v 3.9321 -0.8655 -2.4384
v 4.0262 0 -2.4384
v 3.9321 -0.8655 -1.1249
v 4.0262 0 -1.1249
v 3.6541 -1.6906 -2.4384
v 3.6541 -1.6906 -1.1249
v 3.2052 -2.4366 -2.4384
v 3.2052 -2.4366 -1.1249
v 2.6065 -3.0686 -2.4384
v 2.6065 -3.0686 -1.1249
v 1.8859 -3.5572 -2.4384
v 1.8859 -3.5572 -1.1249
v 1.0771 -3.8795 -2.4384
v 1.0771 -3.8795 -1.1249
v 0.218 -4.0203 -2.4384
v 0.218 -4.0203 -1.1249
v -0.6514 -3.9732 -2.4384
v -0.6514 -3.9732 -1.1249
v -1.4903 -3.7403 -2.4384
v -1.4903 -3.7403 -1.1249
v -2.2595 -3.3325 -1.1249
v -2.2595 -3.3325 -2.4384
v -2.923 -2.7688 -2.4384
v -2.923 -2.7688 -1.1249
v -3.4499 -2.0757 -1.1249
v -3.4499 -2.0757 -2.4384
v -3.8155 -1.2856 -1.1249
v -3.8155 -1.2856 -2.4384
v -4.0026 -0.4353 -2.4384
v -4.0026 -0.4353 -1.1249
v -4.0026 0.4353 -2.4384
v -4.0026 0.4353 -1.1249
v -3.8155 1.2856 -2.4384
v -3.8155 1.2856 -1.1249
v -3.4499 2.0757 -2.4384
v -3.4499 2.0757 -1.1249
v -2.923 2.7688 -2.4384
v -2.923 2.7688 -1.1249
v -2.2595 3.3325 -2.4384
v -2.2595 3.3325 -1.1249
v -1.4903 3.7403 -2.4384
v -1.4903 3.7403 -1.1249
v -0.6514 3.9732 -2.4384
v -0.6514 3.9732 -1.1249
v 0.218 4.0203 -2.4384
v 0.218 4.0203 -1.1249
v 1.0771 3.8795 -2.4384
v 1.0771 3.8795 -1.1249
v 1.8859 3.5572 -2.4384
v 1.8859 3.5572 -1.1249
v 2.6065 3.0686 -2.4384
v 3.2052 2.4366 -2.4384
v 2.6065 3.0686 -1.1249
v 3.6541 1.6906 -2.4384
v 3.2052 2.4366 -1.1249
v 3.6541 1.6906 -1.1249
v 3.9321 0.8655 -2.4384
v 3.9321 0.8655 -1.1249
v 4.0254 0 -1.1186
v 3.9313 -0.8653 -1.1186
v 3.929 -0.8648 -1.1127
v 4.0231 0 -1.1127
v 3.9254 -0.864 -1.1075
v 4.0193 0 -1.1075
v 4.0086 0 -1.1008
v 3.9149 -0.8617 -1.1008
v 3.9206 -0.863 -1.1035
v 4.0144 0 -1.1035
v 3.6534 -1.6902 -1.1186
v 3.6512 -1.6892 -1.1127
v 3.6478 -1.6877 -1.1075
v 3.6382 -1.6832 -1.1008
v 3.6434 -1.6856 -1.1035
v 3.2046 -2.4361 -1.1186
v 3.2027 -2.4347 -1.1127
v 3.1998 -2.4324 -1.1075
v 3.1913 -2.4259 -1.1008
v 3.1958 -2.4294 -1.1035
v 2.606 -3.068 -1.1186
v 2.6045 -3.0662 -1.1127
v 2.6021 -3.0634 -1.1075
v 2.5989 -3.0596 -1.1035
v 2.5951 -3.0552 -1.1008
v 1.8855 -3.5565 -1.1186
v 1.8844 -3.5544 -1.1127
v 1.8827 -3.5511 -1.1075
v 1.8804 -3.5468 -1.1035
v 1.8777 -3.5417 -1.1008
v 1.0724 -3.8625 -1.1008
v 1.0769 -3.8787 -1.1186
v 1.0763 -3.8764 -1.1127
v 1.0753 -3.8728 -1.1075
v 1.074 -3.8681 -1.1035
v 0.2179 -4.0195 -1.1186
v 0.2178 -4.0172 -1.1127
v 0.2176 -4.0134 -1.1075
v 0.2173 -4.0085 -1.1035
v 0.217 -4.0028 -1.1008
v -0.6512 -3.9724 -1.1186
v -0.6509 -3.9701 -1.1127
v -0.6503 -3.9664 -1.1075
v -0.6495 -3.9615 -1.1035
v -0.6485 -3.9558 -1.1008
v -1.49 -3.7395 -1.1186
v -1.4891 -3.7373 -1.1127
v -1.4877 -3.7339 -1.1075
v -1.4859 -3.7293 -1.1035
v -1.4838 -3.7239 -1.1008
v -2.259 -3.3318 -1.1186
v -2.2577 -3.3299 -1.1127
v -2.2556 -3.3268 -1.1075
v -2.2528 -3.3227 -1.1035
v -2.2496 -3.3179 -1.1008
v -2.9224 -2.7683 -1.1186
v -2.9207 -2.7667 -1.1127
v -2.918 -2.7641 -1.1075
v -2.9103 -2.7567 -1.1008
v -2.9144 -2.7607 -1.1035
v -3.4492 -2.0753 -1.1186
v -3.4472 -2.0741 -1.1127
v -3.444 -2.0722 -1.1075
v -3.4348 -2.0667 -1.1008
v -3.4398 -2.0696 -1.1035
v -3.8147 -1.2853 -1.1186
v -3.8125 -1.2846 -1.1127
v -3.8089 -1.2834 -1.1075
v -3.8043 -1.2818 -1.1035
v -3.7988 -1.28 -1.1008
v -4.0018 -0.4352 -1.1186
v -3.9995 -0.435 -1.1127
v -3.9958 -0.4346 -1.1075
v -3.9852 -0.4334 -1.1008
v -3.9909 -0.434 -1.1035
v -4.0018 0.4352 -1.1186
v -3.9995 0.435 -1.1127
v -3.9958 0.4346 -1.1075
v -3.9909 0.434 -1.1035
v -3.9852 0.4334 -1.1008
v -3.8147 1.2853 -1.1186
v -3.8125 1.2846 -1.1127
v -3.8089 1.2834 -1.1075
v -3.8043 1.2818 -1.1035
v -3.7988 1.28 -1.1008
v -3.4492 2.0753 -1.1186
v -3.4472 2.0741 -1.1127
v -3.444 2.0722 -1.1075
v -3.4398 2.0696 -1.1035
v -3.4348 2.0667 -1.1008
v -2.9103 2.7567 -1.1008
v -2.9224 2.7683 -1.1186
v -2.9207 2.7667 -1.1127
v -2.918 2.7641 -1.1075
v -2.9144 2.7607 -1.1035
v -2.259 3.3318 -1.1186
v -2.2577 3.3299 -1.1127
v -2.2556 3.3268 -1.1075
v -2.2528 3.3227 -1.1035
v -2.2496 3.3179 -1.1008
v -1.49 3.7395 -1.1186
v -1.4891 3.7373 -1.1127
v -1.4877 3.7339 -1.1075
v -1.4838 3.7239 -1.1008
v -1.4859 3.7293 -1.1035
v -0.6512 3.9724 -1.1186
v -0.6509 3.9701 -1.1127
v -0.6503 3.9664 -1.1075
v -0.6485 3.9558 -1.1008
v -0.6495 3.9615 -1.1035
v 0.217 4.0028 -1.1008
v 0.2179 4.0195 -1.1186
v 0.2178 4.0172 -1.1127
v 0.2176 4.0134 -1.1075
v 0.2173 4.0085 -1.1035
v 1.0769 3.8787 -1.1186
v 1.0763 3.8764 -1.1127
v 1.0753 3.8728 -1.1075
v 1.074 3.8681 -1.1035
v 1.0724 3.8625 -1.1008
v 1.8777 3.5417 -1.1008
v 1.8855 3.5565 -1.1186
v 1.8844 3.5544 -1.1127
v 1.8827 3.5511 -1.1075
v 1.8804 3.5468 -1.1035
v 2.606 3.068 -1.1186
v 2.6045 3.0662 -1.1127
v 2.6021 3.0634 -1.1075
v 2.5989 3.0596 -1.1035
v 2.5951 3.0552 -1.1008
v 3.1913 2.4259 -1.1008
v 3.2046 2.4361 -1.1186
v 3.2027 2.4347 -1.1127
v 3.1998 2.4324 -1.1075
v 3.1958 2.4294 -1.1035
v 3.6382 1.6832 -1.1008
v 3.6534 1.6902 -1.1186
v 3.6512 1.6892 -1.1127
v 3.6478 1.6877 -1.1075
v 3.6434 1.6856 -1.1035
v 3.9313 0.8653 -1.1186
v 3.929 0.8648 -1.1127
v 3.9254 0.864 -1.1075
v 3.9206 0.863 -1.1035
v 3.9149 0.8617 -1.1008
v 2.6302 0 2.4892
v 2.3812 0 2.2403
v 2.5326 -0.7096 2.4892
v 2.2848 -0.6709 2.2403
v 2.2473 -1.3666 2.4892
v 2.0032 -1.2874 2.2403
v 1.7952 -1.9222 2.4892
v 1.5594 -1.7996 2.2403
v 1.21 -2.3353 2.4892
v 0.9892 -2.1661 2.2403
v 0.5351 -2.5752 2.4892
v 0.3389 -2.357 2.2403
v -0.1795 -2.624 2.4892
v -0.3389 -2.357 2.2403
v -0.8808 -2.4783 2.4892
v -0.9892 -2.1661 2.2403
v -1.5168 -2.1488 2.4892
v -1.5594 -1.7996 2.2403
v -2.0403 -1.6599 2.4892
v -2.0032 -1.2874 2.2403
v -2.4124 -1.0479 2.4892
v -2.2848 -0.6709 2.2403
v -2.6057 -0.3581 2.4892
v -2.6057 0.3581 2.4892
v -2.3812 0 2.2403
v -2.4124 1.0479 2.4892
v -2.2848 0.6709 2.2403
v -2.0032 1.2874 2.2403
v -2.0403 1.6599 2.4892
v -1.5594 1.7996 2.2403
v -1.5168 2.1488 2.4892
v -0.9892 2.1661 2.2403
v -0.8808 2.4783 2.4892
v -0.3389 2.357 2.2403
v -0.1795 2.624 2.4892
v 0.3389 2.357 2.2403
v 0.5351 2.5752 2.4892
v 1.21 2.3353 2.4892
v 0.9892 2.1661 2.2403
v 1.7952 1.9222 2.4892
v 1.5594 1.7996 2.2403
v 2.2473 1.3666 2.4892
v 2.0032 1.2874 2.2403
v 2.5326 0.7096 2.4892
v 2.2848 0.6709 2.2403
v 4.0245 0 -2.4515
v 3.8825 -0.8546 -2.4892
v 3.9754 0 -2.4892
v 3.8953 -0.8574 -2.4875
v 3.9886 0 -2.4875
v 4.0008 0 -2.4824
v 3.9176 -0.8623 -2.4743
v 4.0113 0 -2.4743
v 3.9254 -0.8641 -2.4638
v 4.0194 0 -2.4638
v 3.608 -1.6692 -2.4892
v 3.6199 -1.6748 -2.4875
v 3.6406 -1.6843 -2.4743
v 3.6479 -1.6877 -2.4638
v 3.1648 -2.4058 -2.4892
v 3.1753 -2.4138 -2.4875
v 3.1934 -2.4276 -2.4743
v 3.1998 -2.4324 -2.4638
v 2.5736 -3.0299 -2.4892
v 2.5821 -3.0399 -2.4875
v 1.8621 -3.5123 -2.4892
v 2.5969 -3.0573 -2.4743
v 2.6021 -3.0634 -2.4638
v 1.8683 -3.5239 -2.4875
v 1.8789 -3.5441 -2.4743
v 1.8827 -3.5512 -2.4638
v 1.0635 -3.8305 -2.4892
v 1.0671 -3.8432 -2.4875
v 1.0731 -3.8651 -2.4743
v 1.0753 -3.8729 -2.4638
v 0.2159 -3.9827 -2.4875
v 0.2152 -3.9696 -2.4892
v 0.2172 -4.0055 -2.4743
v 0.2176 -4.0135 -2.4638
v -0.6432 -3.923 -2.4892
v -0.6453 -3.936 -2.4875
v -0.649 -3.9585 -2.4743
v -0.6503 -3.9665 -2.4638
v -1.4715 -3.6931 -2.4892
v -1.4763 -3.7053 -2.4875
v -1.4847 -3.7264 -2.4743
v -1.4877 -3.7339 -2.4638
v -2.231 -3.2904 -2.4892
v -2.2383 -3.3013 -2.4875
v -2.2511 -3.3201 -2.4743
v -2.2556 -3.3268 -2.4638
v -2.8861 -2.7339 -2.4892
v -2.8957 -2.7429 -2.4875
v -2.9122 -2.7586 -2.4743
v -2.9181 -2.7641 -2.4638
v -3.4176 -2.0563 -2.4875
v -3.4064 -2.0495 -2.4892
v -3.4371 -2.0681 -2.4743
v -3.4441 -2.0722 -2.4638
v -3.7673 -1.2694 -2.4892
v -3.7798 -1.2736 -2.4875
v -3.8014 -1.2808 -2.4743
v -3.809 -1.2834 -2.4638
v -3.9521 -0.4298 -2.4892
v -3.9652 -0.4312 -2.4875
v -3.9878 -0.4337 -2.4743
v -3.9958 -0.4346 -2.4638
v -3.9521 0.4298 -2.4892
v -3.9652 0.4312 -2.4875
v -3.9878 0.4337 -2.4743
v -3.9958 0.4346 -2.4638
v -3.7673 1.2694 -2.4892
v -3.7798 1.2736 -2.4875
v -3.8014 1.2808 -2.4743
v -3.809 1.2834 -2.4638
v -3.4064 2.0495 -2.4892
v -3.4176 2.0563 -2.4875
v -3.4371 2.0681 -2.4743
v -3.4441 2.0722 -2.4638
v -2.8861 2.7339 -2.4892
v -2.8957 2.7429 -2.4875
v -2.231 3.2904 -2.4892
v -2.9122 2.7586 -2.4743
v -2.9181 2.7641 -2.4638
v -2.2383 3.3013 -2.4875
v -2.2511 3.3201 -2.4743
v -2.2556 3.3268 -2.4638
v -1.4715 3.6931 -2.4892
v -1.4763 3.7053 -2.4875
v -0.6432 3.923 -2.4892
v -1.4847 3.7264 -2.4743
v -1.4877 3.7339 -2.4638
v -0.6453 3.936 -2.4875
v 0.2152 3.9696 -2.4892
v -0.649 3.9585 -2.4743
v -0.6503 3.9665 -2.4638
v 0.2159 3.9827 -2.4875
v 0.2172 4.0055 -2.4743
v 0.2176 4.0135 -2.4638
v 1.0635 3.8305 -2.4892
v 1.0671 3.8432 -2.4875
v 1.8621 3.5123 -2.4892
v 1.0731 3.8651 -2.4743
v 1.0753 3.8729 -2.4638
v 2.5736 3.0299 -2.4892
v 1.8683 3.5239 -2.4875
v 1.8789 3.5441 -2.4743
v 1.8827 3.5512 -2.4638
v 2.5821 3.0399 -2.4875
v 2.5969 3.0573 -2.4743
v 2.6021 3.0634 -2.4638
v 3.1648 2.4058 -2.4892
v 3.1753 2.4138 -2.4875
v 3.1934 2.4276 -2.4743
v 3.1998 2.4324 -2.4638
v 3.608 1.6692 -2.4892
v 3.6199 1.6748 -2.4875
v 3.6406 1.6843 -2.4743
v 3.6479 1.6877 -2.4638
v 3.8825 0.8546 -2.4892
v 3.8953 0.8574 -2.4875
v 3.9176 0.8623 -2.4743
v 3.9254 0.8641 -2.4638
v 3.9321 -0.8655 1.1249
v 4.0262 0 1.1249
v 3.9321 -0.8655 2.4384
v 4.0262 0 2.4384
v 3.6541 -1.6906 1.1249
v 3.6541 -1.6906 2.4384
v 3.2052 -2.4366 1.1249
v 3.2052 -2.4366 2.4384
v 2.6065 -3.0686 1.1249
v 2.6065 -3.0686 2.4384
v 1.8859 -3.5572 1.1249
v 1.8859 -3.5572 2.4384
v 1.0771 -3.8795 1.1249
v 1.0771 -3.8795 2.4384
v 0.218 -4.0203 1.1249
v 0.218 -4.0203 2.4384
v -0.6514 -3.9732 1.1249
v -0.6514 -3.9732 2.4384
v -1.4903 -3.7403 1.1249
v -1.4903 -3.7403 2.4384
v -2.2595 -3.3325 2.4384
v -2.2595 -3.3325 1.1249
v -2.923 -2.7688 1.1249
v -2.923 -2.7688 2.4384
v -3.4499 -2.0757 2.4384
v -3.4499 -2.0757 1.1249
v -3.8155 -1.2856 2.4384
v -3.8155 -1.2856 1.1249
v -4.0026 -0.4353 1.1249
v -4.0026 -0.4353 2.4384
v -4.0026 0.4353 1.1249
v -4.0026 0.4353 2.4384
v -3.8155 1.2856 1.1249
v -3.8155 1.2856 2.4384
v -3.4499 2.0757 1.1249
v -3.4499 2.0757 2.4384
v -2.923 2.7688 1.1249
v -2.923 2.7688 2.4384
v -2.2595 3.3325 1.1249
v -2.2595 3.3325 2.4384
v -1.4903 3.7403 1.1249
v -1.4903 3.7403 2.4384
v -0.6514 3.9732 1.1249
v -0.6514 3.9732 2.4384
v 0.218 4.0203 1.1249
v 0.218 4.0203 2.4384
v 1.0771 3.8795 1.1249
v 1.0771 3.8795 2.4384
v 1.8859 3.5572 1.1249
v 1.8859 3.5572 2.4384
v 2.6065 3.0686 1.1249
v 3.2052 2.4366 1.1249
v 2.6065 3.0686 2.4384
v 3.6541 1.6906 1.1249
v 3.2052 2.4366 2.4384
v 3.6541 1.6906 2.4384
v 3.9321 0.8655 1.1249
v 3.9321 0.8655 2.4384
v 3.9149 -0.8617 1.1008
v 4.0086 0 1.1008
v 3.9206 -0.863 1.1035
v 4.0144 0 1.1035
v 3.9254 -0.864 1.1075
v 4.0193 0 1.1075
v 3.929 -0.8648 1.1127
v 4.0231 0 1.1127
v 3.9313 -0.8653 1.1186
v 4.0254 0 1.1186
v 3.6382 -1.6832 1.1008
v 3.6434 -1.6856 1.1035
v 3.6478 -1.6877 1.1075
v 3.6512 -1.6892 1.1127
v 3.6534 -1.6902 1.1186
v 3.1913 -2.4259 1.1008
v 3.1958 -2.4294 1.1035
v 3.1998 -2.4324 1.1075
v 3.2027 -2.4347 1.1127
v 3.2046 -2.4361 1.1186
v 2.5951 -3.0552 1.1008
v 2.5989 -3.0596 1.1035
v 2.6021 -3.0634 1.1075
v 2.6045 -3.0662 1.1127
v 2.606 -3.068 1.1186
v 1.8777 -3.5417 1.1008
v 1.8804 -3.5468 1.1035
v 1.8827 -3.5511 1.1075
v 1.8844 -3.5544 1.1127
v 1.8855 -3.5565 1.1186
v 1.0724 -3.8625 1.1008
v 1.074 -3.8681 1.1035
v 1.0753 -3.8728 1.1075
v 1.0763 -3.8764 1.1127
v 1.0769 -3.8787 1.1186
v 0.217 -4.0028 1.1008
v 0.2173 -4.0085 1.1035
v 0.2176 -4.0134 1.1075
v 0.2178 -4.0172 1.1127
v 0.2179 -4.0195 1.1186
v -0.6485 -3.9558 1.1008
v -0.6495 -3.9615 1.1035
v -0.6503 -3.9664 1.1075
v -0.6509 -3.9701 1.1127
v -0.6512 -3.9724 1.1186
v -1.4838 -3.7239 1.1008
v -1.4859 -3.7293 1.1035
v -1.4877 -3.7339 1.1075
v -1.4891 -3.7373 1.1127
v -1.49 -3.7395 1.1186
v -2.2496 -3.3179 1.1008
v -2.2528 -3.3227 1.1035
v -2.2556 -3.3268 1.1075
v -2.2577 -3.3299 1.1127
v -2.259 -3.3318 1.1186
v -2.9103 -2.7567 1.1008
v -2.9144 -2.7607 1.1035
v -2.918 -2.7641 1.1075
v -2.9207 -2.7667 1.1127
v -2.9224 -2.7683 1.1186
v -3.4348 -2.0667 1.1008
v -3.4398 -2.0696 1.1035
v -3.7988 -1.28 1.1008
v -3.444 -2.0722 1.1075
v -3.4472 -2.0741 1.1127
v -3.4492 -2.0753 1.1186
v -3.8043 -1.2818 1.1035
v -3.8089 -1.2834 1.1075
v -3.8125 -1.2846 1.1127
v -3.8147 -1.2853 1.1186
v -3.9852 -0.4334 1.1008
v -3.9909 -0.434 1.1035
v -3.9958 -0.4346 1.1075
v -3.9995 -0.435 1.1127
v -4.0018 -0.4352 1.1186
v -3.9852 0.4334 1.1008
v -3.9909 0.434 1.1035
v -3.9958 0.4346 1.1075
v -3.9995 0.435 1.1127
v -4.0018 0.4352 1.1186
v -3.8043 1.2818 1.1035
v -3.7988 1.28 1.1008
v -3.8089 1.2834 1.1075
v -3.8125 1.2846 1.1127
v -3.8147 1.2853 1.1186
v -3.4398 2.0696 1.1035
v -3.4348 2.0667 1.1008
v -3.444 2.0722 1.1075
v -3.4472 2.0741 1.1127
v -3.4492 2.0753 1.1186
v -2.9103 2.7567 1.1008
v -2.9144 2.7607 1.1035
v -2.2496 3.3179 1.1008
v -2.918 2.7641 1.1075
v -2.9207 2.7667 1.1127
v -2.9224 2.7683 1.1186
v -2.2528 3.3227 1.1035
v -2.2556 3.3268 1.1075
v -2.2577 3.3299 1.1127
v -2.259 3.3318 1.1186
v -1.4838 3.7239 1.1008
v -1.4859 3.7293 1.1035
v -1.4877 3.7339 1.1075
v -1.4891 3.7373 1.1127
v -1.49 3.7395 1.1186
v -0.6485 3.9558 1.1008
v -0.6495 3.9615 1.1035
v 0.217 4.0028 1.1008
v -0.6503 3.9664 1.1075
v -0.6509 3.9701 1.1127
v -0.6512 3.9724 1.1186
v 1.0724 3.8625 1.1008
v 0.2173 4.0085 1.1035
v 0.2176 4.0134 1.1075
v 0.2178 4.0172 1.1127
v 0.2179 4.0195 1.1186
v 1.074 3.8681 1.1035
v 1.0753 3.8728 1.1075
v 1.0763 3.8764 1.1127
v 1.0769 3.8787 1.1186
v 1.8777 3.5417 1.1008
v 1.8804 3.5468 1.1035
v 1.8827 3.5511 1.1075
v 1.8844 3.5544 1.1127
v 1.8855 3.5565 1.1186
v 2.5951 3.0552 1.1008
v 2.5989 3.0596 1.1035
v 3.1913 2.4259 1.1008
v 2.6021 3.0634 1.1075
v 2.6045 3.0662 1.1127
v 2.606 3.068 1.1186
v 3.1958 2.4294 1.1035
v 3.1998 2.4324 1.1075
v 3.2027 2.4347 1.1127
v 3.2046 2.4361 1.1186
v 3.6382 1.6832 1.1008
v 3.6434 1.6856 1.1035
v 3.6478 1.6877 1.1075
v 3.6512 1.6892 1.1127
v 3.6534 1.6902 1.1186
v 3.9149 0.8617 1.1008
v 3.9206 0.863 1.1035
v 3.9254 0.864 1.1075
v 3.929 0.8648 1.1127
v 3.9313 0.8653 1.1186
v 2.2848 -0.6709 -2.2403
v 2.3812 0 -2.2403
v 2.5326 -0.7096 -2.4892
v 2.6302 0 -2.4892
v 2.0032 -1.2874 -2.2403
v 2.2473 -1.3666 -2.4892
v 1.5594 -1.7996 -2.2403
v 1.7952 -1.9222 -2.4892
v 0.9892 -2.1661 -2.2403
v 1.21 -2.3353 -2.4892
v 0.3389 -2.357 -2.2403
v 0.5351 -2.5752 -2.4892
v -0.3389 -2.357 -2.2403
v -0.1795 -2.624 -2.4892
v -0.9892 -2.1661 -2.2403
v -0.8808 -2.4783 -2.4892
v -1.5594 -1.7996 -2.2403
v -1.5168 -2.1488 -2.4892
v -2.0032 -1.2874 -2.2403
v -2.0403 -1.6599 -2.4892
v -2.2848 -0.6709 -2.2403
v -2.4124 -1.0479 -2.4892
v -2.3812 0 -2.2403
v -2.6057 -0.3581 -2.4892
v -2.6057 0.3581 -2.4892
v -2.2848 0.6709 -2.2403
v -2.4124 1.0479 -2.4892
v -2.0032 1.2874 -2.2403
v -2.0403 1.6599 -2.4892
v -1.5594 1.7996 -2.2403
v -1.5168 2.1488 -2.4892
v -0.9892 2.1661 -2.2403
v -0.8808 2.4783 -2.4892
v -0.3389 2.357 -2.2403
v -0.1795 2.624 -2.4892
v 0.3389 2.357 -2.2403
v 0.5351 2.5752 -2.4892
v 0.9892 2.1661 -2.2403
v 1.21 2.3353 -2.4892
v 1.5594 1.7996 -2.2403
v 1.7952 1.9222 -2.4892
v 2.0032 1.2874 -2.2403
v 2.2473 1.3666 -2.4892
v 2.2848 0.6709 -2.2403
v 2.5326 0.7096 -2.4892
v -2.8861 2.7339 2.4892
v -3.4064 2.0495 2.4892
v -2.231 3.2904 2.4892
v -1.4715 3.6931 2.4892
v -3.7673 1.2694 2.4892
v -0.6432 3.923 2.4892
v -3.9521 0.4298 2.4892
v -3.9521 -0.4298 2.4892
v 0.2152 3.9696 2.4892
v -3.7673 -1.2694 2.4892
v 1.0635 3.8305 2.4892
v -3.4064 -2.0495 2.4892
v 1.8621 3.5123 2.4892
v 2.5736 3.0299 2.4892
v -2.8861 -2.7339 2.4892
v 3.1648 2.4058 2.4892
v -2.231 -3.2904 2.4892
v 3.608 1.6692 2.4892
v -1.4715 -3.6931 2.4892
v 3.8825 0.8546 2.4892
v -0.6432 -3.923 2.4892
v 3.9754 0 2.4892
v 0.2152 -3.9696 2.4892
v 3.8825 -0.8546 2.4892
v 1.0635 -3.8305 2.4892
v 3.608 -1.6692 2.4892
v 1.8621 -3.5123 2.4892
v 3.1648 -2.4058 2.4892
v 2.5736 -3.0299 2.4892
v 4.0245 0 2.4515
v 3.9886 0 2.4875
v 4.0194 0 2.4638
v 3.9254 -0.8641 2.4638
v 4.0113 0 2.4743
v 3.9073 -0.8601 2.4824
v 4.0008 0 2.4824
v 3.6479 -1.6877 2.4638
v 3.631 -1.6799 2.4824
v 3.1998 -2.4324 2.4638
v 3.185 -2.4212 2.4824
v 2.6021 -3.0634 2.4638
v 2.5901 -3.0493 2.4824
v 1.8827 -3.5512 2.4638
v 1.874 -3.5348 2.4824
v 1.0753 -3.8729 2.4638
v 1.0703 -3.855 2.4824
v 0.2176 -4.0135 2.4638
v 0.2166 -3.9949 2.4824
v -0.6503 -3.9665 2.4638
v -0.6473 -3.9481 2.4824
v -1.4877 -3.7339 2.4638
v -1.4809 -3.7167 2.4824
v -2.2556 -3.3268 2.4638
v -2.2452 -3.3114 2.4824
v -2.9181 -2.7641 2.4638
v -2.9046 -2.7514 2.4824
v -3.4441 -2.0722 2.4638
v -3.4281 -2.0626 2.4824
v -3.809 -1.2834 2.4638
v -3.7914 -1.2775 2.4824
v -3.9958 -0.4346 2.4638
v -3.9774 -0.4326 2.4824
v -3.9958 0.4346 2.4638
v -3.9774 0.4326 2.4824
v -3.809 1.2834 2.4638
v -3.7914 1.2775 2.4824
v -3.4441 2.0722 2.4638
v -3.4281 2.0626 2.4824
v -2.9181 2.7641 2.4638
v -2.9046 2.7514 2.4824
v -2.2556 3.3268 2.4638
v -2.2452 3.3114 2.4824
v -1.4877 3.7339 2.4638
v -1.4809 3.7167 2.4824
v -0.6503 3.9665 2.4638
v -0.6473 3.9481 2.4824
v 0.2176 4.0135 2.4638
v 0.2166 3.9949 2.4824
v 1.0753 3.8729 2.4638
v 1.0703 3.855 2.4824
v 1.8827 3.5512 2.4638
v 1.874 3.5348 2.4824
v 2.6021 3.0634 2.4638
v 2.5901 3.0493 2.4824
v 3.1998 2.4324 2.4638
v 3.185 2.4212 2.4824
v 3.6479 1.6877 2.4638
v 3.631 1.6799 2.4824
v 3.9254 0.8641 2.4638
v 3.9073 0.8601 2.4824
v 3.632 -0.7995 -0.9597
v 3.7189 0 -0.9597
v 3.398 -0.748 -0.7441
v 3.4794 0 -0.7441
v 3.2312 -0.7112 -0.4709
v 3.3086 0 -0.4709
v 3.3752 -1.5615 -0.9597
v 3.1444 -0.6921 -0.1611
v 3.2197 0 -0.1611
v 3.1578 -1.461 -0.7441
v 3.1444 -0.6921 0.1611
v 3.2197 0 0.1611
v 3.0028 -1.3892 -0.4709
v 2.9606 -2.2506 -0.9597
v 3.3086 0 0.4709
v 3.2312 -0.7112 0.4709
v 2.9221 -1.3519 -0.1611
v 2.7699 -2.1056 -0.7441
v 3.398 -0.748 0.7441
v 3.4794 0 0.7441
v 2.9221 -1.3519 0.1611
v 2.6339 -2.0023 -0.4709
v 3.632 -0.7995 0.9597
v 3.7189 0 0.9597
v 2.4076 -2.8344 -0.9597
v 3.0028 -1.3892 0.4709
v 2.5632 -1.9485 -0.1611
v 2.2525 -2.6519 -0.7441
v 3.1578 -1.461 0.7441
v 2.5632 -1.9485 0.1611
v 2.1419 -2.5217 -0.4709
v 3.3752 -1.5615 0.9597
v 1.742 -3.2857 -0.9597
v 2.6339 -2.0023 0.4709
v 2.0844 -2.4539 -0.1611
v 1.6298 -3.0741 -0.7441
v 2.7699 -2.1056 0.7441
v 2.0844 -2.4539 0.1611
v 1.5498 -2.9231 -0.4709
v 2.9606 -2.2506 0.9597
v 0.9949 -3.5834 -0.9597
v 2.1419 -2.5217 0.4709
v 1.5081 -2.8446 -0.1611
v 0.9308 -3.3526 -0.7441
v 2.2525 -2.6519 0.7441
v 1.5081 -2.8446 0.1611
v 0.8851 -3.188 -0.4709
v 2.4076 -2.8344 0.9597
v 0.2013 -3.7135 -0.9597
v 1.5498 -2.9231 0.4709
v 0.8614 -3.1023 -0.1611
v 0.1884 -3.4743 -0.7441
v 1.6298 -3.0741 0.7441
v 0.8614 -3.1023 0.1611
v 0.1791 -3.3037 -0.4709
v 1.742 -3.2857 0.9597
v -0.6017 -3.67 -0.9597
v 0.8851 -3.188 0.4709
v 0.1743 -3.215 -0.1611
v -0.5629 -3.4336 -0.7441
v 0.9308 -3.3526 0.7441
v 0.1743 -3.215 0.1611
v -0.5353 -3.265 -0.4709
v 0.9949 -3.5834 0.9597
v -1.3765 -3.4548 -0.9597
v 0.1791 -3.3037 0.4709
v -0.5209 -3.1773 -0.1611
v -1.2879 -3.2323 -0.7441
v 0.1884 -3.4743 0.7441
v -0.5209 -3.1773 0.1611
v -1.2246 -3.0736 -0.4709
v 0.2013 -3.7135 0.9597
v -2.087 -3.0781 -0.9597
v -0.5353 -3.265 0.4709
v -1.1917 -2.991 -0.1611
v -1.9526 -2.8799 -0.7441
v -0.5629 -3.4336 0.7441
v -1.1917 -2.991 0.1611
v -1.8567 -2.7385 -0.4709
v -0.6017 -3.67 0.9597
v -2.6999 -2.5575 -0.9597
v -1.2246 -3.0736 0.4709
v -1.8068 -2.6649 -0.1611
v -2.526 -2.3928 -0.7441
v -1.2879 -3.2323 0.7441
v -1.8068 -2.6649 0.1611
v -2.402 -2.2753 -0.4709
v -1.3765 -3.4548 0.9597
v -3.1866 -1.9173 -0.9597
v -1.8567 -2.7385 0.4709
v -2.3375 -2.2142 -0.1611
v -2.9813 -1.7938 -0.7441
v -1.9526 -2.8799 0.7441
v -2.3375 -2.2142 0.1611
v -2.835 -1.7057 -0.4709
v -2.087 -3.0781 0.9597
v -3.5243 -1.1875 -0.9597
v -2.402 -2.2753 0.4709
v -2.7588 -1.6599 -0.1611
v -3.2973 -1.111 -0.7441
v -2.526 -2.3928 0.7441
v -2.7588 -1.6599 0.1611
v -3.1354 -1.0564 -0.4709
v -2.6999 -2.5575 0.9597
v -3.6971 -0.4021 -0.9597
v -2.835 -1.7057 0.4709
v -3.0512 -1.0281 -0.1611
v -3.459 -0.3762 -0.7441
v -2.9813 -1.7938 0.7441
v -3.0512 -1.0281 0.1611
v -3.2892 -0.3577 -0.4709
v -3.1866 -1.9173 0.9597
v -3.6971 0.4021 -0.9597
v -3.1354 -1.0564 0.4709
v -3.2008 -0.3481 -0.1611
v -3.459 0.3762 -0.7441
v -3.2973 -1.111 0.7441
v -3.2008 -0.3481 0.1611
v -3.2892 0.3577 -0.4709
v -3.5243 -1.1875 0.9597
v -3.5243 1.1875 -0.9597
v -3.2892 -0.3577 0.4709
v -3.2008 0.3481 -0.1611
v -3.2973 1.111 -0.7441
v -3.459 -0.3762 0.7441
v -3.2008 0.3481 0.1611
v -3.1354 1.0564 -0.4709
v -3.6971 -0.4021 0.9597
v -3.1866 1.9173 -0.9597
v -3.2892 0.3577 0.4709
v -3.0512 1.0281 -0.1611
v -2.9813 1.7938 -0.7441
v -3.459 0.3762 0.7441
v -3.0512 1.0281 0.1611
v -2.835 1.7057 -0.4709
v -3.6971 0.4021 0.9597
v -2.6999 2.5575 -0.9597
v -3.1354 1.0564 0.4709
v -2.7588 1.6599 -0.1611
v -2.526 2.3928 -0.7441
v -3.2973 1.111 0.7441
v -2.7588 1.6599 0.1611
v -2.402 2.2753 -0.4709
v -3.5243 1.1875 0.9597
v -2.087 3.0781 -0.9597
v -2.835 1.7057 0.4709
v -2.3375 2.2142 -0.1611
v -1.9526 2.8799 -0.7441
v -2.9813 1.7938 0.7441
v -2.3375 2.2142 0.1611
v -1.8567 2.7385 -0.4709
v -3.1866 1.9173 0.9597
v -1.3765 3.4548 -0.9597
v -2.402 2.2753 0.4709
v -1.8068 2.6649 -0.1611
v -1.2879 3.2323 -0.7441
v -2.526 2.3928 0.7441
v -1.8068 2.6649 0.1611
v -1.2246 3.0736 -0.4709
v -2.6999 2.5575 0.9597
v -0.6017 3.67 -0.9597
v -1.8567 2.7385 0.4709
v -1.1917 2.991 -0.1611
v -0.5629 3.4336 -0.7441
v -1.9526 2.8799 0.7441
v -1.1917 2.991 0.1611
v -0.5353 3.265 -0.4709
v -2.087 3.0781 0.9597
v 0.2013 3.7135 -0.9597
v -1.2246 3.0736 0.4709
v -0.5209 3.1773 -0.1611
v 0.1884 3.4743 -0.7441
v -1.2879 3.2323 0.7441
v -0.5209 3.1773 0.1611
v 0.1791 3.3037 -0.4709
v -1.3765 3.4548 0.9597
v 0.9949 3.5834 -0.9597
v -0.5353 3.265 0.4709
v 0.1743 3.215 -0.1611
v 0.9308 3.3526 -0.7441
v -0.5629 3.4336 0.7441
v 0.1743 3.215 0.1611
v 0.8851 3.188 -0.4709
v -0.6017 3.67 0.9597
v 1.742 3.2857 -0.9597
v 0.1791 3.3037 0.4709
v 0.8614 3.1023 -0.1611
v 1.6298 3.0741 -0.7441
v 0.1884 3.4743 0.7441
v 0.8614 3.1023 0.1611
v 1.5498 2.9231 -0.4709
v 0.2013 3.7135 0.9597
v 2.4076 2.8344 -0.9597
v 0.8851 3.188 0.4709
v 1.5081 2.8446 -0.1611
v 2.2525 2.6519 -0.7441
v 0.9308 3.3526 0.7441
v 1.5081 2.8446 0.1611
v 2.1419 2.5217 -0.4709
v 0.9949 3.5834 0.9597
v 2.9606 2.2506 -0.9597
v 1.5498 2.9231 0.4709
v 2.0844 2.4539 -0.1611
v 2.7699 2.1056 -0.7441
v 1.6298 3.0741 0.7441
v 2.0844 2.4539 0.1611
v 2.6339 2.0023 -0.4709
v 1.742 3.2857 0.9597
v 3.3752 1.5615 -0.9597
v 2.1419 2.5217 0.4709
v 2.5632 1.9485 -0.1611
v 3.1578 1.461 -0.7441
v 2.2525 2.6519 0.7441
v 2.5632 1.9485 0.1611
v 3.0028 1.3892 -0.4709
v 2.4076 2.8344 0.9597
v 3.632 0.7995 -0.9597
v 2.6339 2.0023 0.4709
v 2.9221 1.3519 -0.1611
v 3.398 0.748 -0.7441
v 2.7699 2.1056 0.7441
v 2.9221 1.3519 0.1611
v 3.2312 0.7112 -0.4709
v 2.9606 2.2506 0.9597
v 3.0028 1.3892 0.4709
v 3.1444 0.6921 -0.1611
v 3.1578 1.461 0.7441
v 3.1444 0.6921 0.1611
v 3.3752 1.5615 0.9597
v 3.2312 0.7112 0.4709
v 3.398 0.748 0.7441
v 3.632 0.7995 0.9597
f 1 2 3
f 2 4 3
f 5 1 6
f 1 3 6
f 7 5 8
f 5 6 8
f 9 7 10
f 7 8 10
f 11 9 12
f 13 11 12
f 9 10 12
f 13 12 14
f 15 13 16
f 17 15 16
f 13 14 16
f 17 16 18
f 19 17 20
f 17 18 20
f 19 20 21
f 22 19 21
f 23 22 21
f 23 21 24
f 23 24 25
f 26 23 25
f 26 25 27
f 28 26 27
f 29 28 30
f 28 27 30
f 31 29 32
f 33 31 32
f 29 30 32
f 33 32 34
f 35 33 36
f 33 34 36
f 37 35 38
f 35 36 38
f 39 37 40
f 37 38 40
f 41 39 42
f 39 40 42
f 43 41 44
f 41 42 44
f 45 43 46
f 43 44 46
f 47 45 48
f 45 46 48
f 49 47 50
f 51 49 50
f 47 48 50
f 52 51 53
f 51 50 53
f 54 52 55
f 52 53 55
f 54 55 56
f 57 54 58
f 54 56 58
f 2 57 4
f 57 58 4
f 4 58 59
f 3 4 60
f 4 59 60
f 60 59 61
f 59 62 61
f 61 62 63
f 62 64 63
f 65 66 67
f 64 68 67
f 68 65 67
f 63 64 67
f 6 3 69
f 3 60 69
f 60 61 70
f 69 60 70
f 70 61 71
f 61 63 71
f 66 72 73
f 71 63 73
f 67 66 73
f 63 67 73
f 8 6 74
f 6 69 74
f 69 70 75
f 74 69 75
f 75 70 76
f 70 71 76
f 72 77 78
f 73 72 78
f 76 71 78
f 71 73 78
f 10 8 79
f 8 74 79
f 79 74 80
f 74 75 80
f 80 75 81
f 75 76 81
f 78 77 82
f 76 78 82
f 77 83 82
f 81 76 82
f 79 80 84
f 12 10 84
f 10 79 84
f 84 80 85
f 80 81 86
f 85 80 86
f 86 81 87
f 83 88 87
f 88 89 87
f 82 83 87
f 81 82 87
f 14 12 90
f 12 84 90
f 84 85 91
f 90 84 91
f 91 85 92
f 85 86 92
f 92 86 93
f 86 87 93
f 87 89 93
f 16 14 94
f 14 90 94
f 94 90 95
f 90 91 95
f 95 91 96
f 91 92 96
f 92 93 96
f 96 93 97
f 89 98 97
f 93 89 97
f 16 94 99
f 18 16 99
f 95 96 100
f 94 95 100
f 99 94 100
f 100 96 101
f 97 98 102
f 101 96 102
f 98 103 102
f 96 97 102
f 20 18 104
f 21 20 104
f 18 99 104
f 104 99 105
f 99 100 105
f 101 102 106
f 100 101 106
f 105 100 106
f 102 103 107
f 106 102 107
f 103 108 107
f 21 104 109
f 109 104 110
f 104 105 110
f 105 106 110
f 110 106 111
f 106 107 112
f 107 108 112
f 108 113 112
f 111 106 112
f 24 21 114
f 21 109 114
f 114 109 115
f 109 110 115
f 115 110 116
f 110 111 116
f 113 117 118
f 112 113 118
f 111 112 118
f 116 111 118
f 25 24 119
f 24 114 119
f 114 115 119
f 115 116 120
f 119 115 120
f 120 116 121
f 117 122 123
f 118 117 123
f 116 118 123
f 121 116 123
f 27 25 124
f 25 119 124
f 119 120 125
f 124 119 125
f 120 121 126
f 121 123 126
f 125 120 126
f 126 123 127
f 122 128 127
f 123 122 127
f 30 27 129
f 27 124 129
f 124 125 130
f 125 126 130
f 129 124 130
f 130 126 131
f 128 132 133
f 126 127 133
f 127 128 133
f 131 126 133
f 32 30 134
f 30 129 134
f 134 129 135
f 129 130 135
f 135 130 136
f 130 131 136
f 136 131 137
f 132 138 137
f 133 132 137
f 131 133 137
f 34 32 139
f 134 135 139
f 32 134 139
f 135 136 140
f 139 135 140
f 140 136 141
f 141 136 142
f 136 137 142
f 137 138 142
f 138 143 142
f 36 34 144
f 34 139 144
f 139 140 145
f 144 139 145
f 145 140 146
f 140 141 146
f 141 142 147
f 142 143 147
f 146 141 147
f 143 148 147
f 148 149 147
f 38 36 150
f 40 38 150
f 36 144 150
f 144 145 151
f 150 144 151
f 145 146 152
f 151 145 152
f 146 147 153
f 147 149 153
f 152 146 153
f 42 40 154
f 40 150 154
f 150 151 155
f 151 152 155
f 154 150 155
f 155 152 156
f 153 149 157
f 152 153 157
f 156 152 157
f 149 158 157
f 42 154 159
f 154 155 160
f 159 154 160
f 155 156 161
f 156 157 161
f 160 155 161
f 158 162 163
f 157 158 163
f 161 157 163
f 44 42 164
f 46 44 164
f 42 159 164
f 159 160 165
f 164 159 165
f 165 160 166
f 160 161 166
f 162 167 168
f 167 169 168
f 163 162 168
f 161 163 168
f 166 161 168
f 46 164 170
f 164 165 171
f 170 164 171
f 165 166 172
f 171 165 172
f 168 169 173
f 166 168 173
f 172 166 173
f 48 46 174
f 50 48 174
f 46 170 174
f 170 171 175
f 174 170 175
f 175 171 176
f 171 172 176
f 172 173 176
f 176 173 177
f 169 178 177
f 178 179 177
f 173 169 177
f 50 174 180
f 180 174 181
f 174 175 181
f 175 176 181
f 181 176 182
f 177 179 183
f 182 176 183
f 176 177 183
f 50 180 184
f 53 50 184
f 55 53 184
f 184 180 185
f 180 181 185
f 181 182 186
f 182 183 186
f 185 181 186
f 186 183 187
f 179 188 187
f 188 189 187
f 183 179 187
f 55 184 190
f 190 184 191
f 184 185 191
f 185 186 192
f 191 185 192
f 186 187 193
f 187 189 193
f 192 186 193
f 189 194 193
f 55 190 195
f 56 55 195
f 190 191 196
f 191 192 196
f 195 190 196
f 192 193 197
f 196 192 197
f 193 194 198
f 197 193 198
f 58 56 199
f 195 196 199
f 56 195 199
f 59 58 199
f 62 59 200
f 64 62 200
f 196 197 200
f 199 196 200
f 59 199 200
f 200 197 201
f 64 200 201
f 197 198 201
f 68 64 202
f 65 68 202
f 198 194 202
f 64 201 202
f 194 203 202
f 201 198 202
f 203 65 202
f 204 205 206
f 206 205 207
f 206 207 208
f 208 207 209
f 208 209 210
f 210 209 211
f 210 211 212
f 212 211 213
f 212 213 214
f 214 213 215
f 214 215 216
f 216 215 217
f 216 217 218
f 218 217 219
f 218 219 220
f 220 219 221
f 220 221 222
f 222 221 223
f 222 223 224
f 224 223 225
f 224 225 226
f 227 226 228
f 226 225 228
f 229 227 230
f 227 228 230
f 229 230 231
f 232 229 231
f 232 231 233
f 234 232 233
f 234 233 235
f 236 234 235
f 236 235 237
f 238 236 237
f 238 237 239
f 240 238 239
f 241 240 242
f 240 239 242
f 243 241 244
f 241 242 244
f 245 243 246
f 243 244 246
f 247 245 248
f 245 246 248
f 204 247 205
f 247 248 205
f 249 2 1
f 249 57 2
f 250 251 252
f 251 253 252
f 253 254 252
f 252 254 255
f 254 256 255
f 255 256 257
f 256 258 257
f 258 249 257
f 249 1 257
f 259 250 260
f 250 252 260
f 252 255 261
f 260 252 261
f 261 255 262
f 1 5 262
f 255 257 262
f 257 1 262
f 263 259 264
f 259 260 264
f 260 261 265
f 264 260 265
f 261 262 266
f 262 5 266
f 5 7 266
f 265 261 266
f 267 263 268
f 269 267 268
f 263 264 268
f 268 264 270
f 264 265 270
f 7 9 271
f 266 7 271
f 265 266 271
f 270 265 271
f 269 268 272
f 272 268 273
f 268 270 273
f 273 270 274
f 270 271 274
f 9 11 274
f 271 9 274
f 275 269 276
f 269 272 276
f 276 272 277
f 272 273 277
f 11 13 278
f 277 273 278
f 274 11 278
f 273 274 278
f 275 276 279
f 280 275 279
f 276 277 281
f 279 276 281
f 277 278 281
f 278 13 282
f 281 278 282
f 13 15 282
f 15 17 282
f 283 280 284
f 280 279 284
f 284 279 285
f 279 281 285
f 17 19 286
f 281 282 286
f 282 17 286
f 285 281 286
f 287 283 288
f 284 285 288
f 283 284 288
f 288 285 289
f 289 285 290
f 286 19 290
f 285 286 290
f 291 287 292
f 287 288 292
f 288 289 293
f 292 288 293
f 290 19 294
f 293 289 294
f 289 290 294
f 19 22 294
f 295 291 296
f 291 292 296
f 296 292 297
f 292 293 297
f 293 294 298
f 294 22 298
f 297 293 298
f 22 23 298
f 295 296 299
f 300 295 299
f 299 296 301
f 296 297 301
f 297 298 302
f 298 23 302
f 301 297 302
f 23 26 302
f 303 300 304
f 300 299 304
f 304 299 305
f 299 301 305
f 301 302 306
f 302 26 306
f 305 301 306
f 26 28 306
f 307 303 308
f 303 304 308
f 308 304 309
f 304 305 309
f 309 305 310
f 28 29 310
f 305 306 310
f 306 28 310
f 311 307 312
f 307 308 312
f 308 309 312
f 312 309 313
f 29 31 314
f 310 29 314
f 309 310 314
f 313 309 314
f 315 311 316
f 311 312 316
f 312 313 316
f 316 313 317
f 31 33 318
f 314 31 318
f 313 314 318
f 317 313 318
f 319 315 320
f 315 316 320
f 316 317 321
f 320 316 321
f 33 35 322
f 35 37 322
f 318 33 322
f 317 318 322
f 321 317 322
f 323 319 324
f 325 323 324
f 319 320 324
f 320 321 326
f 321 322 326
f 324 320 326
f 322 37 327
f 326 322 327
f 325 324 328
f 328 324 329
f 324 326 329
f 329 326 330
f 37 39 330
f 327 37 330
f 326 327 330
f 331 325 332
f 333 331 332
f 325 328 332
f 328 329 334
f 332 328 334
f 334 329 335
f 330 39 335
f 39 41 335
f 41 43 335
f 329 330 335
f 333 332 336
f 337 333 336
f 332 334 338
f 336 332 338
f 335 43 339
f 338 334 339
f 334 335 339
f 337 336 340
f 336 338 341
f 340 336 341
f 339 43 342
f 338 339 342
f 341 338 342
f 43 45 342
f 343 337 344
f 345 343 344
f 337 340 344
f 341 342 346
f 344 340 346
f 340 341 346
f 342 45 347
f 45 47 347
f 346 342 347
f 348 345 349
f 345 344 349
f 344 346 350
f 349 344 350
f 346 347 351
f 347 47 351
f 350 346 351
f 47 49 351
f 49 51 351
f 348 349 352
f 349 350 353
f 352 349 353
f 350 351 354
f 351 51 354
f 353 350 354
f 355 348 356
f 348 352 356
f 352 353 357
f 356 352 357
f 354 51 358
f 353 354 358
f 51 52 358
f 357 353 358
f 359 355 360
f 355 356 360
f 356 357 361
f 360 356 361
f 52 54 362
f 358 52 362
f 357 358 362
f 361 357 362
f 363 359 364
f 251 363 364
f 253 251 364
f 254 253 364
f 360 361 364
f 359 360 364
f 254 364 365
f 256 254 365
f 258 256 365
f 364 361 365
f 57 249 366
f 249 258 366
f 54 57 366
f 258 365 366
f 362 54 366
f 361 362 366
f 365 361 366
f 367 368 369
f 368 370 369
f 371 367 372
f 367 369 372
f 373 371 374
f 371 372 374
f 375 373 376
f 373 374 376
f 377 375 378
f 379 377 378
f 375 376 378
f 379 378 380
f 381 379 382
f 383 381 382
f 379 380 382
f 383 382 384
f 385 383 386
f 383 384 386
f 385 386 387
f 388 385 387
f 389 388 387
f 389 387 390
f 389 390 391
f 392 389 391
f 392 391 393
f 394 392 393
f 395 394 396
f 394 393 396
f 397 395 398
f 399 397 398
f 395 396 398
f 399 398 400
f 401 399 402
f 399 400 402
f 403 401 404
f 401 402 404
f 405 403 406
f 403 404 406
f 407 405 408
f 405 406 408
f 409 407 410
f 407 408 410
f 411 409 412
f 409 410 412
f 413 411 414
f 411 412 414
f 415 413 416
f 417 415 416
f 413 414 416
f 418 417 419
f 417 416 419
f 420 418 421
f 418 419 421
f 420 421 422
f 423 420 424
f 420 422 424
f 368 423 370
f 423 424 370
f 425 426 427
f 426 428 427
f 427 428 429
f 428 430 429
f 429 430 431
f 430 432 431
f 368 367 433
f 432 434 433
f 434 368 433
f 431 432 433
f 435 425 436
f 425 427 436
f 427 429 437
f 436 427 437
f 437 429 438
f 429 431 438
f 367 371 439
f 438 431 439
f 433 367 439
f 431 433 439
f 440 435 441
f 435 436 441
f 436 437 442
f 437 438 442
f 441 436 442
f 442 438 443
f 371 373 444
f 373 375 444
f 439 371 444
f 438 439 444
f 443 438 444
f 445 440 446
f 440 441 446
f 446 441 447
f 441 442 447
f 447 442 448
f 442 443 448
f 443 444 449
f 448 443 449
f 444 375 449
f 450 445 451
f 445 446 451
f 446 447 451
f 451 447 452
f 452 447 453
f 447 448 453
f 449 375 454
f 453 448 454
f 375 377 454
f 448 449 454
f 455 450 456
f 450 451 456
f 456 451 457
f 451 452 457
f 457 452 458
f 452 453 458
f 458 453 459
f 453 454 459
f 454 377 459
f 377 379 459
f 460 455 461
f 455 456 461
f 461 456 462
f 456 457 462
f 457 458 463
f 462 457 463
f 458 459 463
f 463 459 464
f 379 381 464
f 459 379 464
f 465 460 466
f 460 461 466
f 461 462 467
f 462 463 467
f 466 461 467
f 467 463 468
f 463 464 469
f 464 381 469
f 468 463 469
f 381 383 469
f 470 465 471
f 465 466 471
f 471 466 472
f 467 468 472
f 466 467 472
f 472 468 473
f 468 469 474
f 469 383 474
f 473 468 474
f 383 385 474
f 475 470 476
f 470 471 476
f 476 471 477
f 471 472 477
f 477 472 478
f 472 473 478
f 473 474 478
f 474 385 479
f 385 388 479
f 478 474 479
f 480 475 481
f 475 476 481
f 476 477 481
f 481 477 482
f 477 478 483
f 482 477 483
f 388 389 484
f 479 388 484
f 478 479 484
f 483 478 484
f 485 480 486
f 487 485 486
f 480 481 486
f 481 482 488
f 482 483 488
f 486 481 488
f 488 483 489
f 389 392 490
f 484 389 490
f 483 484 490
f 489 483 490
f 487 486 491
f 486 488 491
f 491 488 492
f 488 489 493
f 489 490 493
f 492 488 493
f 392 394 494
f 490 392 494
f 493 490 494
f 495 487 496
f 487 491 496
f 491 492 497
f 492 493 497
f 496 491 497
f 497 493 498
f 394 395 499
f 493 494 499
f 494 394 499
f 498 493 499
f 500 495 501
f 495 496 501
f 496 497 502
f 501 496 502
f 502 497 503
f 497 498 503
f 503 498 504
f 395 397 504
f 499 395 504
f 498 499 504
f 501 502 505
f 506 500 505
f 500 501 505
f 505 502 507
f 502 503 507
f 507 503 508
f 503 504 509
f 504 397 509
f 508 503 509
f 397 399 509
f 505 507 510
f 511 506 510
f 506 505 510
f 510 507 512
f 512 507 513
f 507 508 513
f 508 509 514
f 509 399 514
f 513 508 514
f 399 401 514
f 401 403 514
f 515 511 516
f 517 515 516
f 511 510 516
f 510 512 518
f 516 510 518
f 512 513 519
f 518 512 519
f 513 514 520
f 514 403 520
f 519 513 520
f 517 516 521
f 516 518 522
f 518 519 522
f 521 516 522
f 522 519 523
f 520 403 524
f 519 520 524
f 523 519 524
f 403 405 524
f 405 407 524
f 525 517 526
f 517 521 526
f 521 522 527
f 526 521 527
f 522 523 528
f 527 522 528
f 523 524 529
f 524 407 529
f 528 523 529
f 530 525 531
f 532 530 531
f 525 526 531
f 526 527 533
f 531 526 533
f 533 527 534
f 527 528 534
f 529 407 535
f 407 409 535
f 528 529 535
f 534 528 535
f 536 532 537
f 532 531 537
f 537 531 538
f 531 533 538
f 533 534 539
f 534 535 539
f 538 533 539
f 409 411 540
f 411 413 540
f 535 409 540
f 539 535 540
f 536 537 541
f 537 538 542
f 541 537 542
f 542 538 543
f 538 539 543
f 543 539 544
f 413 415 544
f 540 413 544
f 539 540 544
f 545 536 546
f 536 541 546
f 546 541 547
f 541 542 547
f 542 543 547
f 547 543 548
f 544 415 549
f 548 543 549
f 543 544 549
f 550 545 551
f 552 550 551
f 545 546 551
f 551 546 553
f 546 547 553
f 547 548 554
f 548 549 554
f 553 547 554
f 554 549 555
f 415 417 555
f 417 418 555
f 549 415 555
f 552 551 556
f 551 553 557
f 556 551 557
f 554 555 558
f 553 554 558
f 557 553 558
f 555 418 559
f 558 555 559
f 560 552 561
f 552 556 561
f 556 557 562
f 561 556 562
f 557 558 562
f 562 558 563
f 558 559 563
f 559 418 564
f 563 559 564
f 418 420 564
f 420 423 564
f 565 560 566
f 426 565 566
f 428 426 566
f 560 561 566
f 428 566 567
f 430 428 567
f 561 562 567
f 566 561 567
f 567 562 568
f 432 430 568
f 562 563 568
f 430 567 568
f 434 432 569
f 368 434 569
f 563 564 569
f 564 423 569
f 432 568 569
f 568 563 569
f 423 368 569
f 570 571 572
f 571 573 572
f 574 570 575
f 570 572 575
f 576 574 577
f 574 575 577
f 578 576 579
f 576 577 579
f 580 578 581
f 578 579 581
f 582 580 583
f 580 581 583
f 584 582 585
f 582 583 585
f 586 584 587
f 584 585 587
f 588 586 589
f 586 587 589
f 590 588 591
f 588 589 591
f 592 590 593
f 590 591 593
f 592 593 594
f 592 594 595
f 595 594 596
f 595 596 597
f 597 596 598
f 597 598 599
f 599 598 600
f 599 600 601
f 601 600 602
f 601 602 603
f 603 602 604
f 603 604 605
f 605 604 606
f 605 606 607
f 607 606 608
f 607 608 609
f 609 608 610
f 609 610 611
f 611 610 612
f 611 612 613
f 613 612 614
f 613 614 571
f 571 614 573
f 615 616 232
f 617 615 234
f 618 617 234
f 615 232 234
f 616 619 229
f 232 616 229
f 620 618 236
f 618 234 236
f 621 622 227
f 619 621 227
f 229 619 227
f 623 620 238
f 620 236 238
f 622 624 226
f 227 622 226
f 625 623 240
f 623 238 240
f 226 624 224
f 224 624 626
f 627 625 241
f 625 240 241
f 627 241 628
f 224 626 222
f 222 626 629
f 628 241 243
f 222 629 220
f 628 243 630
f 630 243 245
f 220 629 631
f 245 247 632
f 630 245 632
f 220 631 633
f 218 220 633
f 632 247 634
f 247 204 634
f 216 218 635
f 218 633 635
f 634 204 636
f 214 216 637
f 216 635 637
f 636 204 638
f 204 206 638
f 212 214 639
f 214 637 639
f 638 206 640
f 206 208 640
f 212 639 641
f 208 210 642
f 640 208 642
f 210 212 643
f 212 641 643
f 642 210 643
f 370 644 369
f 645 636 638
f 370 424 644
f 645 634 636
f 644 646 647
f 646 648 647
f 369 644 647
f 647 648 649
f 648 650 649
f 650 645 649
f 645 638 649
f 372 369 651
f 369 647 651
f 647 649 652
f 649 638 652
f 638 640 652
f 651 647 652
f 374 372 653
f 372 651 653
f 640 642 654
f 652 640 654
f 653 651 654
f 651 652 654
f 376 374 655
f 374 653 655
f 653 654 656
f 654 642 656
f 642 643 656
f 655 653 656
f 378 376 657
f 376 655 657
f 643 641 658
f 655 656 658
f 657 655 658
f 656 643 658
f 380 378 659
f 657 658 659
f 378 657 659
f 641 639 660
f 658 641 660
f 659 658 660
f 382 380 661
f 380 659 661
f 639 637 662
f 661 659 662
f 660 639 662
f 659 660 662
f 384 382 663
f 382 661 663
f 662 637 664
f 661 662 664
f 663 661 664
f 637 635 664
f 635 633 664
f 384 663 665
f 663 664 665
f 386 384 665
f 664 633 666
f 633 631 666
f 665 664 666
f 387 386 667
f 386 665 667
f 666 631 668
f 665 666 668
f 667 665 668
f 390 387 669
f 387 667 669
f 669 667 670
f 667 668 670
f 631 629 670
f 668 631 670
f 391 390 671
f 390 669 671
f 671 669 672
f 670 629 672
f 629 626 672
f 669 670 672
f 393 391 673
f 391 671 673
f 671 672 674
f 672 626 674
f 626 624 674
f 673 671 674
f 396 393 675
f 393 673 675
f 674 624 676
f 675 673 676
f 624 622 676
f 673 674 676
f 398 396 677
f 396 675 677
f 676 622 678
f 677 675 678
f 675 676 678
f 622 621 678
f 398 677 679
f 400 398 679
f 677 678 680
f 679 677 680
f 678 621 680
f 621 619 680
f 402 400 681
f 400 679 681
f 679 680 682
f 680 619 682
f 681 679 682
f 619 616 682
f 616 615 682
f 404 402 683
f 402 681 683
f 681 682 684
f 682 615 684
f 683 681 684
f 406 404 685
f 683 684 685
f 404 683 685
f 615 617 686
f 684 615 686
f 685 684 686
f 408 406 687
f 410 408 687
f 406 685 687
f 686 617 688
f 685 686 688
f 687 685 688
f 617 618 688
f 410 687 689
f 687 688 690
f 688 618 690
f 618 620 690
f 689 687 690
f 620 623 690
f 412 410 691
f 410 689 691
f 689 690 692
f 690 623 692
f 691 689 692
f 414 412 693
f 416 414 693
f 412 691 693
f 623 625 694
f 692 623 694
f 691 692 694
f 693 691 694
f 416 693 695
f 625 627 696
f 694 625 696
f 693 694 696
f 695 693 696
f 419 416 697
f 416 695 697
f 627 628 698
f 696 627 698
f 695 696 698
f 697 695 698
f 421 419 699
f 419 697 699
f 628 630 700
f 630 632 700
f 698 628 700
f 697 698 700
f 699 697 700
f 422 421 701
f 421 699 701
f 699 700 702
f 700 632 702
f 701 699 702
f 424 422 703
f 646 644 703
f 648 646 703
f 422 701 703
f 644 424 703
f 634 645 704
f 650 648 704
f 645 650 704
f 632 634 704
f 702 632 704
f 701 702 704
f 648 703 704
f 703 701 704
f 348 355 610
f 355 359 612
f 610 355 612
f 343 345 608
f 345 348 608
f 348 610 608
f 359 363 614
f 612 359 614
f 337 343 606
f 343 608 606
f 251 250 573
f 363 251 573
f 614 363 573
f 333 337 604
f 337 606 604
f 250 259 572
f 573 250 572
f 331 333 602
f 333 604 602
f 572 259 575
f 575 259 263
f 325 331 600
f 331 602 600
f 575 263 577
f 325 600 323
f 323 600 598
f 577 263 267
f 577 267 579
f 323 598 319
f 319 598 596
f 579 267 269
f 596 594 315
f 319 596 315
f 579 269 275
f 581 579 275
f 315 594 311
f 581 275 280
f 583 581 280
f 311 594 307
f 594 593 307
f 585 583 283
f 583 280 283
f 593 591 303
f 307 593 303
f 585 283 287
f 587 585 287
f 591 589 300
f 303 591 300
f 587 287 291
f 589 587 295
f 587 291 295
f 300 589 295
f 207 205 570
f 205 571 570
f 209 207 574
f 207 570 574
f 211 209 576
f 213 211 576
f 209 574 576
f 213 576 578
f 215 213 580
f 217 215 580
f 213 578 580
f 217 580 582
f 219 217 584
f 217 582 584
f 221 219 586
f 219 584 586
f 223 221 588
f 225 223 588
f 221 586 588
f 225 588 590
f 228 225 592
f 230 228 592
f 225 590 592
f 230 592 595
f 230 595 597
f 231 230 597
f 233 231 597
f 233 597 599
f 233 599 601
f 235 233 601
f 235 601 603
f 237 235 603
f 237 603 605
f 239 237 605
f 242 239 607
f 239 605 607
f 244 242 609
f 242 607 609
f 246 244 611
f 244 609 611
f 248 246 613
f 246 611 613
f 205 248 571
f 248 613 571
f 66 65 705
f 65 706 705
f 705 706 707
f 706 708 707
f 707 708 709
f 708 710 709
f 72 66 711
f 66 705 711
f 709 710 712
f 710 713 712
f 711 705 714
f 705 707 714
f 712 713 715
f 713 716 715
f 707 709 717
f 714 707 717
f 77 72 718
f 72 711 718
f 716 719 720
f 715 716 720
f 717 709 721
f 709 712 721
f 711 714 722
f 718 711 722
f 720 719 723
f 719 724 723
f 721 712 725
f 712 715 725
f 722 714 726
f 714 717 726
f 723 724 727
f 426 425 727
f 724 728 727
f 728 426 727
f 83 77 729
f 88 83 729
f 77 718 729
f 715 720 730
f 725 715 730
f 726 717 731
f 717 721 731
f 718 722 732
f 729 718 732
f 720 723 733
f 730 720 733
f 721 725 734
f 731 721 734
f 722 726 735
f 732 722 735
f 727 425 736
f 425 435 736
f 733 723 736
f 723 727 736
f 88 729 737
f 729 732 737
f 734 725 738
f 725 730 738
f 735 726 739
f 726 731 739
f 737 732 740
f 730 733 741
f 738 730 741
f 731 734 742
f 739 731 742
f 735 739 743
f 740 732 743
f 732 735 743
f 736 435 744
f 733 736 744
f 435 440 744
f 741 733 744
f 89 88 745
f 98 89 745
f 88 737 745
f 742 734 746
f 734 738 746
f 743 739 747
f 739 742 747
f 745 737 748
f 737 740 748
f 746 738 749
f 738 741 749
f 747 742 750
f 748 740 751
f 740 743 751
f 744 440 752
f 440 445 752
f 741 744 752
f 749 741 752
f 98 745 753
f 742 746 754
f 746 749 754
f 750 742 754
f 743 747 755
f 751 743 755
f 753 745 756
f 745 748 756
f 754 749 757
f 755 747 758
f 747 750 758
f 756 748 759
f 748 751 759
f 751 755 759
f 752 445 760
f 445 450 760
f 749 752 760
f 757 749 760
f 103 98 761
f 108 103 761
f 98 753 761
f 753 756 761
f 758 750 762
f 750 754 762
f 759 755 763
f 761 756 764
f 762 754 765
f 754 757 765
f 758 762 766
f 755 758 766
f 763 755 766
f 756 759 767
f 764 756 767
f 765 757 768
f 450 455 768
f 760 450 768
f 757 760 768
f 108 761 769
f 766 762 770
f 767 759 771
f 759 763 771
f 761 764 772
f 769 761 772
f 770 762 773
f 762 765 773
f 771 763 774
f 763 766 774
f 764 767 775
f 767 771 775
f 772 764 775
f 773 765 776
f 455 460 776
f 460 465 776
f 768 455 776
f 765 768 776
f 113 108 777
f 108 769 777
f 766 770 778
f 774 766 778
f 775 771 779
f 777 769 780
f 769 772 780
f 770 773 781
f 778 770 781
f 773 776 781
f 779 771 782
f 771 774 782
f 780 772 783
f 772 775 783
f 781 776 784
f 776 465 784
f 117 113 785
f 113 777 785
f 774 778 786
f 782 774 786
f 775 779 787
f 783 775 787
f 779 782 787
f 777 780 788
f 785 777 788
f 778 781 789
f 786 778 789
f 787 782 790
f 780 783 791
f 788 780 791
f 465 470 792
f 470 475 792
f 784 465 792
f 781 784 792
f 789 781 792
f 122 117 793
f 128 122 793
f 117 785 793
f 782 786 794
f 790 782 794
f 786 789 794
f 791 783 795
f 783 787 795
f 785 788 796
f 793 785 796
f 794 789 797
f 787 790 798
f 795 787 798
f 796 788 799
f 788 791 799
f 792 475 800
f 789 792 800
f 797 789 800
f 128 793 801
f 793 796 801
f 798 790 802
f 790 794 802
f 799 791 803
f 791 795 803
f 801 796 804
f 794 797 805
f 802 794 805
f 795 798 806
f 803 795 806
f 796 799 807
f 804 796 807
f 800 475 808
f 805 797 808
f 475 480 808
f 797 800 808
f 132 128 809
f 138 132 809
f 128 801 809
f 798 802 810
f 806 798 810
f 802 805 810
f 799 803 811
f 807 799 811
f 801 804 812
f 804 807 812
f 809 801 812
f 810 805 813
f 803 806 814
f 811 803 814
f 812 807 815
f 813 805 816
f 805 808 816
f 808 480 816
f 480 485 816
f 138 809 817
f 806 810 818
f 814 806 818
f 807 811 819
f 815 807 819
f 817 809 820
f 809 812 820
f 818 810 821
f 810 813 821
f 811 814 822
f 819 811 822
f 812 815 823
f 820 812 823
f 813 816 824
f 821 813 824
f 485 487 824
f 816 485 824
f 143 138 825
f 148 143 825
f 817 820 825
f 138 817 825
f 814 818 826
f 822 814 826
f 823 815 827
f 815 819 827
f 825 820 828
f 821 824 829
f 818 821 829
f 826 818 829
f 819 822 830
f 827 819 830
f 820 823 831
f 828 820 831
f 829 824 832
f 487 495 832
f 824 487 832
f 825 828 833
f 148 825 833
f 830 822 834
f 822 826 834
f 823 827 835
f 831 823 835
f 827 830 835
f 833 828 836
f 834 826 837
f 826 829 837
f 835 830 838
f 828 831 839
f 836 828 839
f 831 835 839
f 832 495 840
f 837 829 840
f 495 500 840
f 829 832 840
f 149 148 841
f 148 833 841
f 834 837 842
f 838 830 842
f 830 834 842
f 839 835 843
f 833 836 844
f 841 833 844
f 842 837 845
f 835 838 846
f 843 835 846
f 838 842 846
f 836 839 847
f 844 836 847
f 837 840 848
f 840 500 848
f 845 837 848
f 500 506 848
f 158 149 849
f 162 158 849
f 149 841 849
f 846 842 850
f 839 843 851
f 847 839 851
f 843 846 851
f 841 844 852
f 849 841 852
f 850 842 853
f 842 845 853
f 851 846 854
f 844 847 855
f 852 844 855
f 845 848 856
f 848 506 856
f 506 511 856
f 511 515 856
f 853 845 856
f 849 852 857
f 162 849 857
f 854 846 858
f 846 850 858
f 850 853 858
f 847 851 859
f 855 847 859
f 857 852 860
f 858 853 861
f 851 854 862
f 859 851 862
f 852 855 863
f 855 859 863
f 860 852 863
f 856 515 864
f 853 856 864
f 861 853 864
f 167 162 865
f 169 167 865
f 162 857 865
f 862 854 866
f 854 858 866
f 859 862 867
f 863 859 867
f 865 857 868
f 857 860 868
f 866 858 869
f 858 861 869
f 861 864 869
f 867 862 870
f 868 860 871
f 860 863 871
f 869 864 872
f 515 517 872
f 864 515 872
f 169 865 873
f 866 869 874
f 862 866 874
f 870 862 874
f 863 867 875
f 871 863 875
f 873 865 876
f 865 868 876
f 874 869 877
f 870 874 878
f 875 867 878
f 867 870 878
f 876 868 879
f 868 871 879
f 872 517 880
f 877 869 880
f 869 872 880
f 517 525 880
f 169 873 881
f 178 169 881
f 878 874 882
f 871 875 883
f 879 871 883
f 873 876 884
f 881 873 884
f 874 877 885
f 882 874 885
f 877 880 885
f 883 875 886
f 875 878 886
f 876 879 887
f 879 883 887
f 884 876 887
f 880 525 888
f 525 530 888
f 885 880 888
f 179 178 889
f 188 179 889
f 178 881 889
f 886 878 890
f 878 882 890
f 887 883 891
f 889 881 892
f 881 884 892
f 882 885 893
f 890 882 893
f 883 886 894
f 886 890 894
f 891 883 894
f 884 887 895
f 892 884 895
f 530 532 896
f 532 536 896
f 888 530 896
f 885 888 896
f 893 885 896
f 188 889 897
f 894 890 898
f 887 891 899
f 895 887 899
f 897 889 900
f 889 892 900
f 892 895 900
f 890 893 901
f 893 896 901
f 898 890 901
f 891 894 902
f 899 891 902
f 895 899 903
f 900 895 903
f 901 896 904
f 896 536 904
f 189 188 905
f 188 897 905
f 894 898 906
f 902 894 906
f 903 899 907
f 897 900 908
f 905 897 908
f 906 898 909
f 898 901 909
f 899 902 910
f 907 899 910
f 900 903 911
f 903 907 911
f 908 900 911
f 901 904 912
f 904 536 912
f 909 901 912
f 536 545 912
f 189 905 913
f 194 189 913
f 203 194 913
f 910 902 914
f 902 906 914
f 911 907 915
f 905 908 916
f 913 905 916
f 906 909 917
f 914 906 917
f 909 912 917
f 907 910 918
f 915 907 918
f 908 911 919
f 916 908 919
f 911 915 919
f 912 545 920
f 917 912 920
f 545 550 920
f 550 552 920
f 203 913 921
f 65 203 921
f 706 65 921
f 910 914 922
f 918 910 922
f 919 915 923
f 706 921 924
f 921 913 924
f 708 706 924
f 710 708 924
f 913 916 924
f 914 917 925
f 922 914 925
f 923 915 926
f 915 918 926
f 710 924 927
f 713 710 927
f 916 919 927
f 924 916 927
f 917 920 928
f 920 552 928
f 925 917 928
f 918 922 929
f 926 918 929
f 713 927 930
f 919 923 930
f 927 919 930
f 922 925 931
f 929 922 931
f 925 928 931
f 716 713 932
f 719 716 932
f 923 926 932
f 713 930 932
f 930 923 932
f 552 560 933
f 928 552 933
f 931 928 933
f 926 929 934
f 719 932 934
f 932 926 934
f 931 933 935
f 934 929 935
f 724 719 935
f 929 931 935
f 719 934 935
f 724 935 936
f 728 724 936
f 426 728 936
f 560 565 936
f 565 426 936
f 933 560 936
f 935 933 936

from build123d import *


with BuildPart() as part:
    # Inner Bearing Race Profile → Inner Bearing Race (revolve)
    with BuildSketch(Plane(origin=(0, 0, 0), x_dir=(0, 0, -1), z_dir=(1, 0, 0))):
        with BuildLine():
            Line((2.24028, 2.38125), (2.4892, 2.63017))
            Line((2.4892, 2.63017), (2.4892, 3.975414011))
            ThreePointArc((2.4892, 3.975414011), (2.474321024, 4.011335035), (2.4384, 4.026214011))
            Line((2.4384, 4.026214011), (1.12493032, 4.026214011))
            ThreePointArc((1.12493032, 4.026214011), (1.109994783, 4.021358833), (1.100769063, 4.008649422))
            ThreePointArc((1.100769063, 4.008649422), (0, 3.208419705), (-1.100769063, 4.008649422))
            ThreePointArc((-1.100769063, 4.008649422), (-1.109994783, 4.021358833), (-1.12493032, 4.026214011))
            Line((-1.12493032, 4.026214011), (-2.4384, 4.026214011))
            ThreePointArc((-2.4384, 4.026214011), (-2.474321024, 4.011335035), (-2.4892, 3.975414011))
            Line((-2.4892, 3.975414011), (-2.4892, 2.63017))
            Line((-2.4892, 2.63017), (-2.24028, 2.38125))
            Line((-2.24028, 2.38125), (2.24028, 2.38125))
        make_face()
    revolve(axis=Axis((0, 0, 2.4892), (0, 0, -1)))


solid = part.part
